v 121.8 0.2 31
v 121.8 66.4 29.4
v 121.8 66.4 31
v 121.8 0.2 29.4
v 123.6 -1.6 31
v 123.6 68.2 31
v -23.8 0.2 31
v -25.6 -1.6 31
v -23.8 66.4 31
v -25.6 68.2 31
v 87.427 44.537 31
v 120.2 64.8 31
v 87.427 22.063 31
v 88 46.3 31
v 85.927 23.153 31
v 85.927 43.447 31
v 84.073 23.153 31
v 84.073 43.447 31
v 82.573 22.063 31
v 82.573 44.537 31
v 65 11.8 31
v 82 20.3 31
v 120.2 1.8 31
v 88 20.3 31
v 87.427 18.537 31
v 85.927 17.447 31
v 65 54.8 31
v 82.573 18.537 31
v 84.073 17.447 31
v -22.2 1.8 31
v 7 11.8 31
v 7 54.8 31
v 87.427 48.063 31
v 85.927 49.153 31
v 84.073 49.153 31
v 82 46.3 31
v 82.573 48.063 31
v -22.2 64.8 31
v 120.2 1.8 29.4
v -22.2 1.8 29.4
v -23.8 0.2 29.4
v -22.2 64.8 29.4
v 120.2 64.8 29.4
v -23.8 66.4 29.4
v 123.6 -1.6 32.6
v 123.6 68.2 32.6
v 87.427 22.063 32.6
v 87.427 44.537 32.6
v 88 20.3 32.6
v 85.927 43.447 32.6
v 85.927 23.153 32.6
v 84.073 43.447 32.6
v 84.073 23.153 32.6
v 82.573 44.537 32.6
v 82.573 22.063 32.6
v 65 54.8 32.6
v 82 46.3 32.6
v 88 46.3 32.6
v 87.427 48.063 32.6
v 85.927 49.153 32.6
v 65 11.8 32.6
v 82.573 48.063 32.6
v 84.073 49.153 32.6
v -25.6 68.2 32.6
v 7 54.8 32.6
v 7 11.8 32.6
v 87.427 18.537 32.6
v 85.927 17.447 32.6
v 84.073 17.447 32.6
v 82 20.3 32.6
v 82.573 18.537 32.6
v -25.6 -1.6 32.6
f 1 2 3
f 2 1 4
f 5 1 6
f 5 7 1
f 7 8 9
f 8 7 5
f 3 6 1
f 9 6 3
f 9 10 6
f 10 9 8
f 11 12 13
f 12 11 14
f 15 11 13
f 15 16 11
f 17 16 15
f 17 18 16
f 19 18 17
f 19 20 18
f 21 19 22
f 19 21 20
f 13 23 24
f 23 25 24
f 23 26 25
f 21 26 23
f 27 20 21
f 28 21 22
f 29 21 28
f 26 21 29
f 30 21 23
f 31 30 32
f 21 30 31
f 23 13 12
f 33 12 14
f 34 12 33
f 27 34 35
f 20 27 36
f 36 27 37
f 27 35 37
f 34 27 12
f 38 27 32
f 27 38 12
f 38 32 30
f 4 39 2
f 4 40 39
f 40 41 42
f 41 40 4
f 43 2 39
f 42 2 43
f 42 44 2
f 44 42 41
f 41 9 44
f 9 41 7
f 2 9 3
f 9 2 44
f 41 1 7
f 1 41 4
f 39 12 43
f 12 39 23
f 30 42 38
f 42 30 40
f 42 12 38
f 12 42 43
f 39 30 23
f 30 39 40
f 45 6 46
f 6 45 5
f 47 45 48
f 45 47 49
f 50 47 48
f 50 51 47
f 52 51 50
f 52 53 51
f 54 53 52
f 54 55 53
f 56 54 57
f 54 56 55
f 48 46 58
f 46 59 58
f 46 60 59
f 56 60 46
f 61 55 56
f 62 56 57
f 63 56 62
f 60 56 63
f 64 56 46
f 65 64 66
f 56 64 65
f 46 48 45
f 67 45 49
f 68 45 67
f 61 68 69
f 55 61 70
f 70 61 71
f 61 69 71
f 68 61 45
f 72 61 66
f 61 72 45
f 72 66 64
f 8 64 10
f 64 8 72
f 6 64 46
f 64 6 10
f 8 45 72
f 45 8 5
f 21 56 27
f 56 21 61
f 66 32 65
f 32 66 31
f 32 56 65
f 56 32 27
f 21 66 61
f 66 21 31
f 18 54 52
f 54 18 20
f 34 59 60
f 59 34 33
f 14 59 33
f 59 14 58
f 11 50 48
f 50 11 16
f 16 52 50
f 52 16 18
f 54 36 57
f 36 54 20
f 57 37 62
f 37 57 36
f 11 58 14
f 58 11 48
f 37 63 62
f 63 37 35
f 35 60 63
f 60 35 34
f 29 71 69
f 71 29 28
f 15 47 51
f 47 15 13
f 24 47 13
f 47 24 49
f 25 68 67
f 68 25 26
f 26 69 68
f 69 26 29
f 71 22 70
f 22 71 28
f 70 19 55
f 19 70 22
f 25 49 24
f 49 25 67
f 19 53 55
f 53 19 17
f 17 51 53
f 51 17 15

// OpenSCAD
BOARD_WIDTH = 66.6;
BOARD_LENGTH = 122;
SENSOR_BUMP_LENGTH = 24;
TOTAL_LENGTH = BOARD_LENGTH + SENSOR_BUMP_LENGTH;

BOTTOM_CLEARANCE = 20;
TOP_CLEARANCE = 11;

WALL_HEIGHT = BOTTOM_CLEARANCE + TOP_CLEARANCE;
WALL_THICKNESS = 1.6;

POST_SIZE = 4.8;

USB_HOLE_WIDTH = 9;
USB_HOLE_HEIGHT = 4.3;
USB_HOLE_VERTICAL_OFFSET = 2;

SENSOR_WIDTH = 44;
SENSOR_THICKNESS = 2.4;
SENSOR_POST_HEIGHT = 18;
SENSOR_CLEARANCE = 1.6;

TUBE_WIDTH = 6;
TUBE_VERTICAL_OFFSET = 8;

LCD_WIDTH = 43;
LCD_HEIGHT = 58;
LCD_X_OFFSET = 7;

BUTTON_X_OFFSET = 79; //80
BUTTON_DIAMETER = 6;
BUTTON_SPACING = 20; //20.5

TOLERANCE = 0.2;

module baseboard() {
    union() {
         difference() {
            translate([-SENSOR_BUMP_LENGTH, 0, 0]) cube([TOTAL_LENGTH, BOARD_WIDTH, WALL_THICKNESS]);   
             
            // Cutout for prototyping
            translate([3*POST_SIZE/2, WALL_THICKNESS, -0.1]) 
                cube([BOARD_LENGTH-3*POST_SIZE, 
                      BOARD_WIDTH-2*WALL_THICKNESS, 
                      WALL_THICKNESS+2]);
        } 
    }
}

module walls() {
    union() {
        // Side walls
        SIDE_WALL_LENGTH = TOTAL_LENGTH+2*WALL_THICKNESS;
        SIDE_WALL_X_OFFSET = -WALL_THICKNESS-SENSOR_BUMP_LENGTH;
        translate([SIDE_WALL_X_OFFSET, -WALL_THICKNESS, 0]) 
            cube([SIDE_WALL_LENGTH, WALL_THICKNESS, WALL_HEIGHT]);    
        translate([SIDE_WALL_X_OFFSET, BOARD_WIDTH, 0]) 
            cube([SIDE_WALL_LENGTH, WALL_THICKNESS, WALL_HEIGHT]);    
        
        difference() {
            translate([SIDE_WALL_X_OFFSET, 0, 0]) 
                cube([WALL_THICKNESS,BOARD_WIDTH,WALL_HEIGHT]);
            // Tube cutout
            translate([SIDE_WALL_X_OFFSET, BOARD_WIDTH/2-TUBE_WIDTH/2, TUBE_VERTICAL_OFFSET]) 
                cube([WALL_THICKNESS,TUBE_WIDTH,WALL_HEIGHT]);
        }
        
        difference() {
            translate([BOARD_LENGTH, 0, 0]) 
                cube([WALL_THICKNESS,BOARD_WIDTH,WALL_HEIGHT]);
            // USB cutout
            translate([BOARD_LENGTH, BOARD_WIDTH/2-USB_HOLE_WIDTH/2, BOTTOM_CLEARANCE+USB_HOLE_VERTICAL_OFFSET]) 
                cube([WALL_THICKNESS,USB_HOLE_WIDTH,USB_HOLE_HEIGHT]);
        }
    }
}

module post() {
    cube([POST_SIZE,POST_SIZE,BOTTOM_CLEARANCE]);
}

module posts() {
    union() {
        translate([0, 0, 0]) post();
        translate([0, BOARD_WIDTH-POST_SIZE, 0]) post();
        translate([BOARD_LENGTH-POST_SIZE, BOARD_WIDTH-POST_SIZE, 0]) post();
        translate([BOARD_LENGTH-POST_SIZE, 0, 0]) post();
    }
}

module sensor_posts() {
    SENSOR_POST_OFFSET = (BOARD_WIDTH-POST_SIZE)/2;
       
    difference() {
        union() {
            translate([-WALL_THICKNESS-SENSOR_THICKNESS, SENSOR_POST_OFFSET - SENSOR_WIDTH/2, 0]) cube([2*WALL_THICKNESS+SENSOR_THICKNESS, POST_SIZE, SENSOR_POST_HEIGHT]);
            translate([-WALL_THICKNESS-SENSOR_THICKNESS, SENSOR_POST_OFFSET + SENSOR_WIDTH/2,0]) cube([2*WALL_THICKNESS+SENSOR_THICKNESS, POST_SIZE, SENSOR_POST_HEIGHT]);
        }
    
        translate([-SENSOR_THICKNESS, (BOARD_WIDTH-SENSOR_WIDTH)/2-SENSOR_CLEARANCE, 0]) cube([SENSOR_THICKNESS, SENSOR_WIDTH+2*SENSOR_CLEARANCE, SENSOR_POST_HEIGHT]);
    }
   
    
}


module case_bottom() {
   union() {
    baseboard();
    walls();
    posts();
    sensor_posts();
    }
}


module basic_lid() {
    translate([-SENSOR_BUMP_LENGTH-WALL_THICKNESS, -WALL_THICKNESS, WALL_HEIGHT]) 
        cube([TOTAL_LENGTH+2*WALL_THICKNESS, BOARD_WIDTH+2*WALL_THICKNESS, WALL_THICKNESS]);   
    
    difference() {
        translate([-SENSOR_BUMP_LENGTH+TOLERANCE, TOLERANCE, WALL_HEIGHT-WALL_THICKNESS]) 
            cube([TOTAL_LENGTH-2*TOLERANCE, BOARD_WIDTH-2*TOLERANCE, WALL_THICKNESS]);   
        translate([-SENSOR_BUMP_LENGTH+TOLERANCE+WALL_THICKNESS, TOLERANCE+WALL_THICKNESS, WALL_HEIGHT-WALL_THICKNESS]) 
            cube([TOTAL_LENGTH-2*TOLERANCE-2*WALL_THICKNESS, BOARD_WIDTH-2*TOLERANCE-2*WALL_THICKNESS, WALL_THICKNESS]);   
    }
}

module lid_cutouts() {
    translate([LCD_X_OFFSET, BOARD_WIDTH/2-LCD_WIDTH/2, WALL_HEIGHT-WALL_THICKNESS])
        cube([LCD_HEIGHT, LCD_WIDTH, 2*WALL_THICKNESS]);
    
    translate([BUTTON_X_OFFSET+BUTTON_DIAMETER, BOARD_WIDTH/2+BUTTON_SPACING/2+BUTTON_DIAMETER/2, WALL_HEIGHT-WALL_THICKNESS])
        cylinder(h=2*WALL_THICKNESS, d=BUTTON_DIAMETER);
    
    translate([BUTTON_X_OFFSET+BUTTON_DIAMETER, BOARD_WIDTH/2-BUTTON_SPACING/2-BUTTON_DIAMETER/2, WALL_HEIGHT-WALL_THICKNESS])
        cylinder(h=2*WALL_THICKNESS, d=BUTTON_DIAMETER);
}

module lid() {
        difference() {
            basic_lid();
            lid_cutouts();
        }
}

{
    %case_bottom();
    lid();
}
